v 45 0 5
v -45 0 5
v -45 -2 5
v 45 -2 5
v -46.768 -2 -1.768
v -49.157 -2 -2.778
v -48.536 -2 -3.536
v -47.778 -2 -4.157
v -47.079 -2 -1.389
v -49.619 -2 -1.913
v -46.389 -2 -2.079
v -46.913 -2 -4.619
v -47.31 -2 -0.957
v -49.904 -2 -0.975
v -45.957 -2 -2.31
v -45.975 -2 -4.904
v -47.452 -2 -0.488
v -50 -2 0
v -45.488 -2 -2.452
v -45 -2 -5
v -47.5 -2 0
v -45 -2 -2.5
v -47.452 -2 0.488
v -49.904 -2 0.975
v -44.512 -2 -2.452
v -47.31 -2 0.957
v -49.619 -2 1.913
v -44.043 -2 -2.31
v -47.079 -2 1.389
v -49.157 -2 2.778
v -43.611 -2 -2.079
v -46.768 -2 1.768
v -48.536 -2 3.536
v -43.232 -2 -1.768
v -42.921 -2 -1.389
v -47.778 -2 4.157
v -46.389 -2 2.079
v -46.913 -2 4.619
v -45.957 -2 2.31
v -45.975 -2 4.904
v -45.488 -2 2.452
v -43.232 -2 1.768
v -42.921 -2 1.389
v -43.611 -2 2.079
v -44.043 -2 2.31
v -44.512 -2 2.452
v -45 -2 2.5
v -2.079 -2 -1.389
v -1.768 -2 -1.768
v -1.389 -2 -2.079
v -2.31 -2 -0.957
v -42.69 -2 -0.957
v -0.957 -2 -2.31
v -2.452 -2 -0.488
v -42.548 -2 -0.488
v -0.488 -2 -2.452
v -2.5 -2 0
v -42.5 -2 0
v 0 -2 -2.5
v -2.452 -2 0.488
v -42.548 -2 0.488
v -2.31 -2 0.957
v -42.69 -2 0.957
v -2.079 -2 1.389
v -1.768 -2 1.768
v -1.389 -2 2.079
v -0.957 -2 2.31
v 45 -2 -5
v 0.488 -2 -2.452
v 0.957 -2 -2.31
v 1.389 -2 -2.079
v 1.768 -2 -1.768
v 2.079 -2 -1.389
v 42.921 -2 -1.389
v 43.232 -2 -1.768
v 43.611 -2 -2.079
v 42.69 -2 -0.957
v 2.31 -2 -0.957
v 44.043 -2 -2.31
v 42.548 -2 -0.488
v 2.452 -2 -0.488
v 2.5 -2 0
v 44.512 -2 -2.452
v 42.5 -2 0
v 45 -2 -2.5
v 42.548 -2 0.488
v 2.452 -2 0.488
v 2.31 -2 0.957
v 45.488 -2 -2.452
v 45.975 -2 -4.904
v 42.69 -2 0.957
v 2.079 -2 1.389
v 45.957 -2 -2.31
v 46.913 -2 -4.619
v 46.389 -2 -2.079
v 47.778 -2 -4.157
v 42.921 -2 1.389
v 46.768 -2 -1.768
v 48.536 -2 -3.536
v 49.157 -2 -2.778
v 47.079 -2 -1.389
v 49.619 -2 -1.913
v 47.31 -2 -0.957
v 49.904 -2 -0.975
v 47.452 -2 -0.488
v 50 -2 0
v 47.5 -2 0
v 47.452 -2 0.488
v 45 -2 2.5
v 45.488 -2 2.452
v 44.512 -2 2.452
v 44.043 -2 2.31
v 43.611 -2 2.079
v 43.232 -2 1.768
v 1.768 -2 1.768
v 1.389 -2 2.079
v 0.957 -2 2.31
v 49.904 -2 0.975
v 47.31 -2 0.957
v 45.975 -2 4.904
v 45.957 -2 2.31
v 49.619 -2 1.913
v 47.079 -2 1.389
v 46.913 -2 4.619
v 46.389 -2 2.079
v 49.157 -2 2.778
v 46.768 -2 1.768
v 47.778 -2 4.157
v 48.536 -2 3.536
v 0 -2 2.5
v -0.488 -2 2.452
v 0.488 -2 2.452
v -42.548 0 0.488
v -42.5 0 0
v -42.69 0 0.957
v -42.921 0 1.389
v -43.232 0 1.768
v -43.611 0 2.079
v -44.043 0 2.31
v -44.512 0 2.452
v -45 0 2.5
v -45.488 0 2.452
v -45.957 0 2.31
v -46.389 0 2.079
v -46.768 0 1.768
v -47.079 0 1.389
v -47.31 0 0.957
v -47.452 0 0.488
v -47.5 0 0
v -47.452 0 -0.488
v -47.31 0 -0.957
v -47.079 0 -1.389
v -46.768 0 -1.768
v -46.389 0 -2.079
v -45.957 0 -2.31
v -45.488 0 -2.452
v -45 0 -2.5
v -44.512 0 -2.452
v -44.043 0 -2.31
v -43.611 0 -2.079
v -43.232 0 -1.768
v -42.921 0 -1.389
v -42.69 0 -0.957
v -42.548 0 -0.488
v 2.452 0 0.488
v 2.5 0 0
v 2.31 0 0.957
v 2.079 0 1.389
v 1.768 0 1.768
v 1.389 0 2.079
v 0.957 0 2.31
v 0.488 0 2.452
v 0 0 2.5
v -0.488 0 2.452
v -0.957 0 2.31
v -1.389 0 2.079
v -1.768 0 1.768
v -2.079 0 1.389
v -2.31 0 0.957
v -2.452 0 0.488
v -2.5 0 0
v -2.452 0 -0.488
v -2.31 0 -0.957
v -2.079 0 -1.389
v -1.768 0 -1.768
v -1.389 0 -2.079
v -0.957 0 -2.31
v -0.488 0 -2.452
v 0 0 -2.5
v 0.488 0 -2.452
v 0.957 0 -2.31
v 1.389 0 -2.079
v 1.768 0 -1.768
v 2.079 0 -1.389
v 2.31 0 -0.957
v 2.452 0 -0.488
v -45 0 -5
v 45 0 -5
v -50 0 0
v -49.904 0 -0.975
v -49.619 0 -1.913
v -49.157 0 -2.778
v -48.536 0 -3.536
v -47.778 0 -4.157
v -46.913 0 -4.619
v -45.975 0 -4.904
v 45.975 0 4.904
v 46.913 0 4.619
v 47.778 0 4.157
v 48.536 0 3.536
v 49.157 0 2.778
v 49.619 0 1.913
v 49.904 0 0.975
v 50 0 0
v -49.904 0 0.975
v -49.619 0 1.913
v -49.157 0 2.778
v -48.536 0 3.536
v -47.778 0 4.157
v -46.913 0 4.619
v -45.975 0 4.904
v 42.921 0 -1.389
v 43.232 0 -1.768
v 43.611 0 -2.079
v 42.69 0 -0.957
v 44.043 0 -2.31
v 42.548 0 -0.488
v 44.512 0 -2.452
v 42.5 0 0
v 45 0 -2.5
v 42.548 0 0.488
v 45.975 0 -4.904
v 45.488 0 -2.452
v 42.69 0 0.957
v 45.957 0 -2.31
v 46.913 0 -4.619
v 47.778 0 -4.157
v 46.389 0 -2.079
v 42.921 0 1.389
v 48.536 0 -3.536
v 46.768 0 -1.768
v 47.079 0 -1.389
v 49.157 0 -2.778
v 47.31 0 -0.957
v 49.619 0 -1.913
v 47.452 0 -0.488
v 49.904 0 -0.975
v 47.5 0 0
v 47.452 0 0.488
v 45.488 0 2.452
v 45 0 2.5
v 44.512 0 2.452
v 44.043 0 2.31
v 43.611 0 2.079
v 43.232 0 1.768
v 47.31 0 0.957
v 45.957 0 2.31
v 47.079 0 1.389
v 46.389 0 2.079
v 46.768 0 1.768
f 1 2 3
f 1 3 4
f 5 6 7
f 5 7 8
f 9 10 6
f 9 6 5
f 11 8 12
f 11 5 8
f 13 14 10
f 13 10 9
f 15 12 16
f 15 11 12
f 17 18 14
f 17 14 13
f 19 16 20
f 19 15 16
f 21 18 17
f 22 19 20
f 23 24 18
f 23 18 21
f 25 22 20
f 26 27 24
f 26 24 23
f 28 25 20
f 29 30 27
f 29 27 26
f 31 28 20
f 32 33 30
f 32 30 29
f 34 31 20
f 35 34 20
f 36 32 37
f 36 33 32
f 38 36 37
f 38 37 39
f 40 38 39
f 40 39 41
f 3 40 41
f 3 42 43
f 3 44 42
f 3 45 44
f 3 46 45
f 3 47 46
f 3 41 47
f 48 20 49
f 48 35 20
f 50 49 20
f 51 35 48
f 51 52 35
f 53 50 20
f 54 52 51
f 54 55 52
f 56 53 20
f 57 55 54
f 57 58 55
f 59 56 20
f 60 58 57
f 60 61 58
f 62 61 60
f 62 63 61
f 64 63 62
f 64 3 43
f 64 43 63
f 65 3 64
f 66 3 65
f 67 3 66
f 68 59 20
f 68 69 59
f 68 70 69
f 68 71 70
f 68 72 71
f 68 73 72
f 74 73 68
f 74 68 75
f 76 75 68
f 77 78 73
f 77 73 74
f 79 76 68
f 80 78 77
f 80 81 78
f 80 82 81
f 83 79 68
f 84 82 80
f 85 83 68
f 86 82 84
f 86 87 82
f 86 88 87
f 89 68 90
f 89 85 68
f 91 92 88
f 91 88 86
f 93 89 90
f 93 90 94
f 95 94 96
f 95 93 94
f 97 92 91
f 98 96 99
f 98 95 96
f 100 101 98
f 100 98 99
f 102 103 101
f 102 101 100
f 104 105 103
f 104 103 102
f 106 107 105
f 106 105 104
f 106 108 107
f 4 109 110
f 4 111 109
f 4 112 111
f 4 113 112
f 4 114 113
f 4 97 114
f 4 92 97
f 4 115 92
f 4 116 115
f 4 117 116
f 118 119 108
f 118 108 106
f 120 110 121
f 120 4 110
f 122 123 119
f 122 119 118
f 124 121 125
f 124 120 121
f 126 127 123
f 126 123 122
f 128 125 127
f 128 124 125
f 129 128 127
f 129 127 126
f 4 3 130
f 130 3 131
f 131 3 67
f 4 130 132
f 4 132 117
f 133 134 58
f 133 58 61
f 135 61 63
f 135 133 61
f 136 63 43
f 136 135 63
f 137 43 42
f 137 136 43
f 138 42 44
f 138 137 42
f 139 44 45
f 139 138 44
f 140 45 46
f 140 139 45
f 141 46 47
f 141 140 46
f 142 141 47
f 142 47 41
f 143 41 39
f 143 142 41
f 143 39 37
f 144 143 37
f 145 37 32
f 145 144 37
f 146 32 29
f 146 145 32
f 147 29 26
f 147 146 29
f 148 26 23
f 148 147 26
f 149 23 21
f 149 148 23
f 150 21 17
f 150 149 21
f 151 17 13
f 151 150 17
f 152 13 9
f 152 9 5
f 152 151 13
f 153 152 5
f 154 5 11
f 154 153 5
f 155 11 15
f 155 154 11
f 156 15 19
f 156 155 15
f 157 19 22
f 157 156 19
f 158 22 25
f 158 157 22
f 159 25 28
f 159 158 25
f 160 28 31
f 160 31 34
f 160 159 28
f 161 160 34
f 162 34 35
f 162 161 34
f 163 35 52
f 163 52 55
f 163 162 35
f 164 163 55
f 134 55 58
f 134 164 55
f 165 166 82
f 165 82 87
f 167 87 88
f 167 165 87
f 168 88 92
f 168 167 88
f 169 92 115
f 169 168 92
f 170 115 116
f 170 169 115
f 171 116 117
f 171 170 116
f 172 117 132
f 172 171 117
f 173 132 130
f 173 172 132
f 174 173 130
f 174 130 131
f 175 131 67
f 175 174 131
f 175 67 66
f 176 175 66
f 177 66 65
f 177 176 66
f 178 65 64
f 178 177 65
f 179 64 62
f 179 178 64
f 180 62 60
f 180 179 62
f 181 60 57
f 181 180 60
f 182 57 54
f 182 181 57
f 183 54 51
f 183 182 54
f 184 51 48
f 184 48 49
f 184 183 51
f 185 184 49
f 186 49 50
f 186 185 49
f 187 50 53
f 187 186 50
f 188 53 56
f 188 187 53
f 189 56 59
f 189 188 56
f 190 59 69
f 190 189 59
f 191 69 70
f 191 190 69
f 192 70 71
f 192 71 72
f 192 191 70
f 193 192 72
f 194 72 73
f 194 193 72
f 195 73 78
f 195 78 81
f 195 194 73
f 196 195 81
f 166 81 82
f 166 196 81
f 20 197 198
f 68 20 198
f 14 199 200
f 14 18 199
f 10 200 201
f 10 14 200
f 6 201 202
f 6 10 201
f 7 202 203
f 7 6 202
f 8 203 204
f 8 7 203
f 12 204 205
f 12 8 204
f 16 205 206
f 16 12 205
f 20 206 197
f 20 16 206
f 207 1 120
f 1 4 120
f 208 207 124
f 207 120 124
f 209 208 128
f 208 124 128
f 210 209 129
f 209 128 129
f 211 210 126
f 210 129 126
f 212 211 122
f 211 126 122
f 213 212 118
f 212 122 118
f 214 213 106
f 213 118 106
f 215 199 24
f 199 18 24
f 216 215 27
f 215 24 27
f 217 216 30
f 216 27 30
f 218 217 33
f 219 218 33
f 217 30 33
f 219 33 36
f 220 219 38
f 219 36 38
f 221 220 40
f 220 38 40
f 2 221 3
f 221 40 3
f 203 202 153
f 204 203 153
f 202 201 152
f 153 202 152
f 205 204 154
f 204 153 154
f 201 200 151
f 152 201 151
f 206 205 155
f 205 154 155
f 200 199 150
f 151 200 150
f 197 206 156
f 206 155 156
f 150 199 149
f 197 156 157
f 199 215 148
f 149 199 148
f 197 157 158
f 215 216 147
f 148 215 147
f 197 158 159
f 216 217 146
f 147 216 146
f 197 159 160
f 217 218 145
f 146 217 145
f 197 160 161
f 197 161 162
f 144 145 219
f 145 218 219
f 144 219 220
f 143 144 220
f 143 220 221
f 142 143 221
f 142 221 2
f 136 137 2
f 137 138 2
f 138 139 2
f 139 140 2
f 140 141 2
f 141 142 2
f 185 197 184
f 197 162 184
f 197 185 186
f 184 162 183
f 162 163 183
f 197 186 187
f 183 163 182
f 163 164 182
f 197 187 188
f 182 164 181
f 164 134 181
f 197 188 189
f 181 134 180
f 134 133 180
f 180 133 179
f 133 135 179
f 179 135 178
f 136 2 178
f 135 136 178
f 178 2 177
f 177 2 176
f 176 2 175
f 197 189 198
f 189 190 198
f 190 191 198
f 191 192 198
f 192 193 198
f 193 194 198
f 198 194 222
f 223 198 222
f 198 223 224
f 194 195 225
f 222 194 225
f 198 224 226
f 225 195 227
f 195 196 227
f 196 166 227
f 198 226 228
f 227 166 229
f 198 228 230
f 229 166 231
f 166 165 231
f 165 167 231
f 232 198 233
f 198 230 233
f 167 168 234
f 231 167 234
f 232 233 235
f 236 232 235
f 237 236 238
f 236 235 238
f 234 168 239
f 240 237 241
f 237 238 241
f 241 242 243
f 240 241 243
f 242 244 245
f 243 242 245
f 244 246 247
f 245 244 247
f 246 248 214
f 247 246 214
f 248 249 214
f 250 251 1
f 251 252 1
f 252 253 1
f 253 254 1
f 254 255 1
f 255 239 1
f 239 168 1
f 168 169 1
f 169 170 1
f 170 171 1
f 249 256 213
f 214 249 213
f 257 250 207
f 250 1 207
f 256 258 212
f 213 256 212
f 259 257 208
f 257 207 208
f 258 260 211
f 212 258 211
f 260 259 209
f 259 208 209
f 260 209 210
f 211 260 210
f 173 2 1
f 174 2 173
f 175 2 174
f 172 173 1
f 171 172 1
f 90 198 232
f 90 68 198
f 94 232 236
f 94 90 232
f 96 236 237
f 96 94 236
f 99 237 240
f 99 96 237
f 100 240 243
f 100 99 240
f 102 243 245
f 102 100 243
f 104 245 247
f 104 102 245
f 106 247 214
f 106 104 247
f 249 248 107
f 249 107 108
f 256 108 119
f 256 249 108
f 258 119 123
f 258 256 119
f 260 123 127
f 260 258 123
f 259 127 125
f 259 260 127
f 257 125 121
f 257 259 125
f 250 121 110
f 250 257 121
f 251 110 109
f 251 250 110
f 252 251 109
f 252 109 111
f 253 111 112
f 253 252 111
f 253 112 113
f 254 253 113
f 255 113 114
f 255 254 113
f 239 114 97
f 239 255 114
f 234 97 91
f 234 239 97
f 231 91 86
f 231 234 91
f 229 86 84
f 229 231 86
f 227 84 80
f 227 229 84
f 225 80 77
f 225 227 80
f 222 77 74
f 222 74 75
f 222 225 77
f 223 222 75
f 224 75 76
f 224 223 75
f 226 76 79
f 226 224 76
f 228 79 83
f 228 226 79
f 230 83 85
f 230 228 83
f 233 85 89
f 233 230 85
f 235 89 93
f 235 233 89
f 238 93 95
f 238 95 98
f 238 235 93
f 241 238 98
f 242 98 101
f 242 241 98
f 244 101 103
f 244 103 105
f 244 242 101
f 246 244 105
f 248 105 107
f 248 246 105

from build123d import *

# Parameters (mm, degrees)
F0_W     = 100
F0_H     = 10
F0_R     = 2.5
F1_DEPTH = 2
F2_R     = 4.99999


# Not quite as in the source:
# - a fillet or chamfer is up to 0.001 mm smaller than in the source, because OpenCascade refuses the exact size


with BuildPart() as f1:
    # F0 (on Front) → F1 (new body)
    with BuildSketch(Plane.XZ):
        Rectangle(F0_W, F0_H)
        with Locations((-45, 0)):
            Circle(F0_R, mode=Mode.SUBTRACT)
        Circle(F0_R, mode=Mode.SUBTRACT)
        with Locations((45, 0)):
            Circle(F0_R, mode=Mode.SUBTRACT)
    extrude(amount=F1_DEPTH)

    # F2 (radius 5 in the source; OpenCascade refuses exactly that, so slightly less here)
    f2_edges = [f1.edges().sort_by_distance(p)[0] for p in [
        (-50, -1, 5),
        (-50, -1, -5),
        (50, -1, -5),
        (50, -1, 5),
    ]]
    fillet(f2_edges, radius=F2_R)


with BuildPart() as f3_1:
    # F3: copy of F1
    add(f1.part.moved(Location((0, -2, 0))))


solid = f1.part
